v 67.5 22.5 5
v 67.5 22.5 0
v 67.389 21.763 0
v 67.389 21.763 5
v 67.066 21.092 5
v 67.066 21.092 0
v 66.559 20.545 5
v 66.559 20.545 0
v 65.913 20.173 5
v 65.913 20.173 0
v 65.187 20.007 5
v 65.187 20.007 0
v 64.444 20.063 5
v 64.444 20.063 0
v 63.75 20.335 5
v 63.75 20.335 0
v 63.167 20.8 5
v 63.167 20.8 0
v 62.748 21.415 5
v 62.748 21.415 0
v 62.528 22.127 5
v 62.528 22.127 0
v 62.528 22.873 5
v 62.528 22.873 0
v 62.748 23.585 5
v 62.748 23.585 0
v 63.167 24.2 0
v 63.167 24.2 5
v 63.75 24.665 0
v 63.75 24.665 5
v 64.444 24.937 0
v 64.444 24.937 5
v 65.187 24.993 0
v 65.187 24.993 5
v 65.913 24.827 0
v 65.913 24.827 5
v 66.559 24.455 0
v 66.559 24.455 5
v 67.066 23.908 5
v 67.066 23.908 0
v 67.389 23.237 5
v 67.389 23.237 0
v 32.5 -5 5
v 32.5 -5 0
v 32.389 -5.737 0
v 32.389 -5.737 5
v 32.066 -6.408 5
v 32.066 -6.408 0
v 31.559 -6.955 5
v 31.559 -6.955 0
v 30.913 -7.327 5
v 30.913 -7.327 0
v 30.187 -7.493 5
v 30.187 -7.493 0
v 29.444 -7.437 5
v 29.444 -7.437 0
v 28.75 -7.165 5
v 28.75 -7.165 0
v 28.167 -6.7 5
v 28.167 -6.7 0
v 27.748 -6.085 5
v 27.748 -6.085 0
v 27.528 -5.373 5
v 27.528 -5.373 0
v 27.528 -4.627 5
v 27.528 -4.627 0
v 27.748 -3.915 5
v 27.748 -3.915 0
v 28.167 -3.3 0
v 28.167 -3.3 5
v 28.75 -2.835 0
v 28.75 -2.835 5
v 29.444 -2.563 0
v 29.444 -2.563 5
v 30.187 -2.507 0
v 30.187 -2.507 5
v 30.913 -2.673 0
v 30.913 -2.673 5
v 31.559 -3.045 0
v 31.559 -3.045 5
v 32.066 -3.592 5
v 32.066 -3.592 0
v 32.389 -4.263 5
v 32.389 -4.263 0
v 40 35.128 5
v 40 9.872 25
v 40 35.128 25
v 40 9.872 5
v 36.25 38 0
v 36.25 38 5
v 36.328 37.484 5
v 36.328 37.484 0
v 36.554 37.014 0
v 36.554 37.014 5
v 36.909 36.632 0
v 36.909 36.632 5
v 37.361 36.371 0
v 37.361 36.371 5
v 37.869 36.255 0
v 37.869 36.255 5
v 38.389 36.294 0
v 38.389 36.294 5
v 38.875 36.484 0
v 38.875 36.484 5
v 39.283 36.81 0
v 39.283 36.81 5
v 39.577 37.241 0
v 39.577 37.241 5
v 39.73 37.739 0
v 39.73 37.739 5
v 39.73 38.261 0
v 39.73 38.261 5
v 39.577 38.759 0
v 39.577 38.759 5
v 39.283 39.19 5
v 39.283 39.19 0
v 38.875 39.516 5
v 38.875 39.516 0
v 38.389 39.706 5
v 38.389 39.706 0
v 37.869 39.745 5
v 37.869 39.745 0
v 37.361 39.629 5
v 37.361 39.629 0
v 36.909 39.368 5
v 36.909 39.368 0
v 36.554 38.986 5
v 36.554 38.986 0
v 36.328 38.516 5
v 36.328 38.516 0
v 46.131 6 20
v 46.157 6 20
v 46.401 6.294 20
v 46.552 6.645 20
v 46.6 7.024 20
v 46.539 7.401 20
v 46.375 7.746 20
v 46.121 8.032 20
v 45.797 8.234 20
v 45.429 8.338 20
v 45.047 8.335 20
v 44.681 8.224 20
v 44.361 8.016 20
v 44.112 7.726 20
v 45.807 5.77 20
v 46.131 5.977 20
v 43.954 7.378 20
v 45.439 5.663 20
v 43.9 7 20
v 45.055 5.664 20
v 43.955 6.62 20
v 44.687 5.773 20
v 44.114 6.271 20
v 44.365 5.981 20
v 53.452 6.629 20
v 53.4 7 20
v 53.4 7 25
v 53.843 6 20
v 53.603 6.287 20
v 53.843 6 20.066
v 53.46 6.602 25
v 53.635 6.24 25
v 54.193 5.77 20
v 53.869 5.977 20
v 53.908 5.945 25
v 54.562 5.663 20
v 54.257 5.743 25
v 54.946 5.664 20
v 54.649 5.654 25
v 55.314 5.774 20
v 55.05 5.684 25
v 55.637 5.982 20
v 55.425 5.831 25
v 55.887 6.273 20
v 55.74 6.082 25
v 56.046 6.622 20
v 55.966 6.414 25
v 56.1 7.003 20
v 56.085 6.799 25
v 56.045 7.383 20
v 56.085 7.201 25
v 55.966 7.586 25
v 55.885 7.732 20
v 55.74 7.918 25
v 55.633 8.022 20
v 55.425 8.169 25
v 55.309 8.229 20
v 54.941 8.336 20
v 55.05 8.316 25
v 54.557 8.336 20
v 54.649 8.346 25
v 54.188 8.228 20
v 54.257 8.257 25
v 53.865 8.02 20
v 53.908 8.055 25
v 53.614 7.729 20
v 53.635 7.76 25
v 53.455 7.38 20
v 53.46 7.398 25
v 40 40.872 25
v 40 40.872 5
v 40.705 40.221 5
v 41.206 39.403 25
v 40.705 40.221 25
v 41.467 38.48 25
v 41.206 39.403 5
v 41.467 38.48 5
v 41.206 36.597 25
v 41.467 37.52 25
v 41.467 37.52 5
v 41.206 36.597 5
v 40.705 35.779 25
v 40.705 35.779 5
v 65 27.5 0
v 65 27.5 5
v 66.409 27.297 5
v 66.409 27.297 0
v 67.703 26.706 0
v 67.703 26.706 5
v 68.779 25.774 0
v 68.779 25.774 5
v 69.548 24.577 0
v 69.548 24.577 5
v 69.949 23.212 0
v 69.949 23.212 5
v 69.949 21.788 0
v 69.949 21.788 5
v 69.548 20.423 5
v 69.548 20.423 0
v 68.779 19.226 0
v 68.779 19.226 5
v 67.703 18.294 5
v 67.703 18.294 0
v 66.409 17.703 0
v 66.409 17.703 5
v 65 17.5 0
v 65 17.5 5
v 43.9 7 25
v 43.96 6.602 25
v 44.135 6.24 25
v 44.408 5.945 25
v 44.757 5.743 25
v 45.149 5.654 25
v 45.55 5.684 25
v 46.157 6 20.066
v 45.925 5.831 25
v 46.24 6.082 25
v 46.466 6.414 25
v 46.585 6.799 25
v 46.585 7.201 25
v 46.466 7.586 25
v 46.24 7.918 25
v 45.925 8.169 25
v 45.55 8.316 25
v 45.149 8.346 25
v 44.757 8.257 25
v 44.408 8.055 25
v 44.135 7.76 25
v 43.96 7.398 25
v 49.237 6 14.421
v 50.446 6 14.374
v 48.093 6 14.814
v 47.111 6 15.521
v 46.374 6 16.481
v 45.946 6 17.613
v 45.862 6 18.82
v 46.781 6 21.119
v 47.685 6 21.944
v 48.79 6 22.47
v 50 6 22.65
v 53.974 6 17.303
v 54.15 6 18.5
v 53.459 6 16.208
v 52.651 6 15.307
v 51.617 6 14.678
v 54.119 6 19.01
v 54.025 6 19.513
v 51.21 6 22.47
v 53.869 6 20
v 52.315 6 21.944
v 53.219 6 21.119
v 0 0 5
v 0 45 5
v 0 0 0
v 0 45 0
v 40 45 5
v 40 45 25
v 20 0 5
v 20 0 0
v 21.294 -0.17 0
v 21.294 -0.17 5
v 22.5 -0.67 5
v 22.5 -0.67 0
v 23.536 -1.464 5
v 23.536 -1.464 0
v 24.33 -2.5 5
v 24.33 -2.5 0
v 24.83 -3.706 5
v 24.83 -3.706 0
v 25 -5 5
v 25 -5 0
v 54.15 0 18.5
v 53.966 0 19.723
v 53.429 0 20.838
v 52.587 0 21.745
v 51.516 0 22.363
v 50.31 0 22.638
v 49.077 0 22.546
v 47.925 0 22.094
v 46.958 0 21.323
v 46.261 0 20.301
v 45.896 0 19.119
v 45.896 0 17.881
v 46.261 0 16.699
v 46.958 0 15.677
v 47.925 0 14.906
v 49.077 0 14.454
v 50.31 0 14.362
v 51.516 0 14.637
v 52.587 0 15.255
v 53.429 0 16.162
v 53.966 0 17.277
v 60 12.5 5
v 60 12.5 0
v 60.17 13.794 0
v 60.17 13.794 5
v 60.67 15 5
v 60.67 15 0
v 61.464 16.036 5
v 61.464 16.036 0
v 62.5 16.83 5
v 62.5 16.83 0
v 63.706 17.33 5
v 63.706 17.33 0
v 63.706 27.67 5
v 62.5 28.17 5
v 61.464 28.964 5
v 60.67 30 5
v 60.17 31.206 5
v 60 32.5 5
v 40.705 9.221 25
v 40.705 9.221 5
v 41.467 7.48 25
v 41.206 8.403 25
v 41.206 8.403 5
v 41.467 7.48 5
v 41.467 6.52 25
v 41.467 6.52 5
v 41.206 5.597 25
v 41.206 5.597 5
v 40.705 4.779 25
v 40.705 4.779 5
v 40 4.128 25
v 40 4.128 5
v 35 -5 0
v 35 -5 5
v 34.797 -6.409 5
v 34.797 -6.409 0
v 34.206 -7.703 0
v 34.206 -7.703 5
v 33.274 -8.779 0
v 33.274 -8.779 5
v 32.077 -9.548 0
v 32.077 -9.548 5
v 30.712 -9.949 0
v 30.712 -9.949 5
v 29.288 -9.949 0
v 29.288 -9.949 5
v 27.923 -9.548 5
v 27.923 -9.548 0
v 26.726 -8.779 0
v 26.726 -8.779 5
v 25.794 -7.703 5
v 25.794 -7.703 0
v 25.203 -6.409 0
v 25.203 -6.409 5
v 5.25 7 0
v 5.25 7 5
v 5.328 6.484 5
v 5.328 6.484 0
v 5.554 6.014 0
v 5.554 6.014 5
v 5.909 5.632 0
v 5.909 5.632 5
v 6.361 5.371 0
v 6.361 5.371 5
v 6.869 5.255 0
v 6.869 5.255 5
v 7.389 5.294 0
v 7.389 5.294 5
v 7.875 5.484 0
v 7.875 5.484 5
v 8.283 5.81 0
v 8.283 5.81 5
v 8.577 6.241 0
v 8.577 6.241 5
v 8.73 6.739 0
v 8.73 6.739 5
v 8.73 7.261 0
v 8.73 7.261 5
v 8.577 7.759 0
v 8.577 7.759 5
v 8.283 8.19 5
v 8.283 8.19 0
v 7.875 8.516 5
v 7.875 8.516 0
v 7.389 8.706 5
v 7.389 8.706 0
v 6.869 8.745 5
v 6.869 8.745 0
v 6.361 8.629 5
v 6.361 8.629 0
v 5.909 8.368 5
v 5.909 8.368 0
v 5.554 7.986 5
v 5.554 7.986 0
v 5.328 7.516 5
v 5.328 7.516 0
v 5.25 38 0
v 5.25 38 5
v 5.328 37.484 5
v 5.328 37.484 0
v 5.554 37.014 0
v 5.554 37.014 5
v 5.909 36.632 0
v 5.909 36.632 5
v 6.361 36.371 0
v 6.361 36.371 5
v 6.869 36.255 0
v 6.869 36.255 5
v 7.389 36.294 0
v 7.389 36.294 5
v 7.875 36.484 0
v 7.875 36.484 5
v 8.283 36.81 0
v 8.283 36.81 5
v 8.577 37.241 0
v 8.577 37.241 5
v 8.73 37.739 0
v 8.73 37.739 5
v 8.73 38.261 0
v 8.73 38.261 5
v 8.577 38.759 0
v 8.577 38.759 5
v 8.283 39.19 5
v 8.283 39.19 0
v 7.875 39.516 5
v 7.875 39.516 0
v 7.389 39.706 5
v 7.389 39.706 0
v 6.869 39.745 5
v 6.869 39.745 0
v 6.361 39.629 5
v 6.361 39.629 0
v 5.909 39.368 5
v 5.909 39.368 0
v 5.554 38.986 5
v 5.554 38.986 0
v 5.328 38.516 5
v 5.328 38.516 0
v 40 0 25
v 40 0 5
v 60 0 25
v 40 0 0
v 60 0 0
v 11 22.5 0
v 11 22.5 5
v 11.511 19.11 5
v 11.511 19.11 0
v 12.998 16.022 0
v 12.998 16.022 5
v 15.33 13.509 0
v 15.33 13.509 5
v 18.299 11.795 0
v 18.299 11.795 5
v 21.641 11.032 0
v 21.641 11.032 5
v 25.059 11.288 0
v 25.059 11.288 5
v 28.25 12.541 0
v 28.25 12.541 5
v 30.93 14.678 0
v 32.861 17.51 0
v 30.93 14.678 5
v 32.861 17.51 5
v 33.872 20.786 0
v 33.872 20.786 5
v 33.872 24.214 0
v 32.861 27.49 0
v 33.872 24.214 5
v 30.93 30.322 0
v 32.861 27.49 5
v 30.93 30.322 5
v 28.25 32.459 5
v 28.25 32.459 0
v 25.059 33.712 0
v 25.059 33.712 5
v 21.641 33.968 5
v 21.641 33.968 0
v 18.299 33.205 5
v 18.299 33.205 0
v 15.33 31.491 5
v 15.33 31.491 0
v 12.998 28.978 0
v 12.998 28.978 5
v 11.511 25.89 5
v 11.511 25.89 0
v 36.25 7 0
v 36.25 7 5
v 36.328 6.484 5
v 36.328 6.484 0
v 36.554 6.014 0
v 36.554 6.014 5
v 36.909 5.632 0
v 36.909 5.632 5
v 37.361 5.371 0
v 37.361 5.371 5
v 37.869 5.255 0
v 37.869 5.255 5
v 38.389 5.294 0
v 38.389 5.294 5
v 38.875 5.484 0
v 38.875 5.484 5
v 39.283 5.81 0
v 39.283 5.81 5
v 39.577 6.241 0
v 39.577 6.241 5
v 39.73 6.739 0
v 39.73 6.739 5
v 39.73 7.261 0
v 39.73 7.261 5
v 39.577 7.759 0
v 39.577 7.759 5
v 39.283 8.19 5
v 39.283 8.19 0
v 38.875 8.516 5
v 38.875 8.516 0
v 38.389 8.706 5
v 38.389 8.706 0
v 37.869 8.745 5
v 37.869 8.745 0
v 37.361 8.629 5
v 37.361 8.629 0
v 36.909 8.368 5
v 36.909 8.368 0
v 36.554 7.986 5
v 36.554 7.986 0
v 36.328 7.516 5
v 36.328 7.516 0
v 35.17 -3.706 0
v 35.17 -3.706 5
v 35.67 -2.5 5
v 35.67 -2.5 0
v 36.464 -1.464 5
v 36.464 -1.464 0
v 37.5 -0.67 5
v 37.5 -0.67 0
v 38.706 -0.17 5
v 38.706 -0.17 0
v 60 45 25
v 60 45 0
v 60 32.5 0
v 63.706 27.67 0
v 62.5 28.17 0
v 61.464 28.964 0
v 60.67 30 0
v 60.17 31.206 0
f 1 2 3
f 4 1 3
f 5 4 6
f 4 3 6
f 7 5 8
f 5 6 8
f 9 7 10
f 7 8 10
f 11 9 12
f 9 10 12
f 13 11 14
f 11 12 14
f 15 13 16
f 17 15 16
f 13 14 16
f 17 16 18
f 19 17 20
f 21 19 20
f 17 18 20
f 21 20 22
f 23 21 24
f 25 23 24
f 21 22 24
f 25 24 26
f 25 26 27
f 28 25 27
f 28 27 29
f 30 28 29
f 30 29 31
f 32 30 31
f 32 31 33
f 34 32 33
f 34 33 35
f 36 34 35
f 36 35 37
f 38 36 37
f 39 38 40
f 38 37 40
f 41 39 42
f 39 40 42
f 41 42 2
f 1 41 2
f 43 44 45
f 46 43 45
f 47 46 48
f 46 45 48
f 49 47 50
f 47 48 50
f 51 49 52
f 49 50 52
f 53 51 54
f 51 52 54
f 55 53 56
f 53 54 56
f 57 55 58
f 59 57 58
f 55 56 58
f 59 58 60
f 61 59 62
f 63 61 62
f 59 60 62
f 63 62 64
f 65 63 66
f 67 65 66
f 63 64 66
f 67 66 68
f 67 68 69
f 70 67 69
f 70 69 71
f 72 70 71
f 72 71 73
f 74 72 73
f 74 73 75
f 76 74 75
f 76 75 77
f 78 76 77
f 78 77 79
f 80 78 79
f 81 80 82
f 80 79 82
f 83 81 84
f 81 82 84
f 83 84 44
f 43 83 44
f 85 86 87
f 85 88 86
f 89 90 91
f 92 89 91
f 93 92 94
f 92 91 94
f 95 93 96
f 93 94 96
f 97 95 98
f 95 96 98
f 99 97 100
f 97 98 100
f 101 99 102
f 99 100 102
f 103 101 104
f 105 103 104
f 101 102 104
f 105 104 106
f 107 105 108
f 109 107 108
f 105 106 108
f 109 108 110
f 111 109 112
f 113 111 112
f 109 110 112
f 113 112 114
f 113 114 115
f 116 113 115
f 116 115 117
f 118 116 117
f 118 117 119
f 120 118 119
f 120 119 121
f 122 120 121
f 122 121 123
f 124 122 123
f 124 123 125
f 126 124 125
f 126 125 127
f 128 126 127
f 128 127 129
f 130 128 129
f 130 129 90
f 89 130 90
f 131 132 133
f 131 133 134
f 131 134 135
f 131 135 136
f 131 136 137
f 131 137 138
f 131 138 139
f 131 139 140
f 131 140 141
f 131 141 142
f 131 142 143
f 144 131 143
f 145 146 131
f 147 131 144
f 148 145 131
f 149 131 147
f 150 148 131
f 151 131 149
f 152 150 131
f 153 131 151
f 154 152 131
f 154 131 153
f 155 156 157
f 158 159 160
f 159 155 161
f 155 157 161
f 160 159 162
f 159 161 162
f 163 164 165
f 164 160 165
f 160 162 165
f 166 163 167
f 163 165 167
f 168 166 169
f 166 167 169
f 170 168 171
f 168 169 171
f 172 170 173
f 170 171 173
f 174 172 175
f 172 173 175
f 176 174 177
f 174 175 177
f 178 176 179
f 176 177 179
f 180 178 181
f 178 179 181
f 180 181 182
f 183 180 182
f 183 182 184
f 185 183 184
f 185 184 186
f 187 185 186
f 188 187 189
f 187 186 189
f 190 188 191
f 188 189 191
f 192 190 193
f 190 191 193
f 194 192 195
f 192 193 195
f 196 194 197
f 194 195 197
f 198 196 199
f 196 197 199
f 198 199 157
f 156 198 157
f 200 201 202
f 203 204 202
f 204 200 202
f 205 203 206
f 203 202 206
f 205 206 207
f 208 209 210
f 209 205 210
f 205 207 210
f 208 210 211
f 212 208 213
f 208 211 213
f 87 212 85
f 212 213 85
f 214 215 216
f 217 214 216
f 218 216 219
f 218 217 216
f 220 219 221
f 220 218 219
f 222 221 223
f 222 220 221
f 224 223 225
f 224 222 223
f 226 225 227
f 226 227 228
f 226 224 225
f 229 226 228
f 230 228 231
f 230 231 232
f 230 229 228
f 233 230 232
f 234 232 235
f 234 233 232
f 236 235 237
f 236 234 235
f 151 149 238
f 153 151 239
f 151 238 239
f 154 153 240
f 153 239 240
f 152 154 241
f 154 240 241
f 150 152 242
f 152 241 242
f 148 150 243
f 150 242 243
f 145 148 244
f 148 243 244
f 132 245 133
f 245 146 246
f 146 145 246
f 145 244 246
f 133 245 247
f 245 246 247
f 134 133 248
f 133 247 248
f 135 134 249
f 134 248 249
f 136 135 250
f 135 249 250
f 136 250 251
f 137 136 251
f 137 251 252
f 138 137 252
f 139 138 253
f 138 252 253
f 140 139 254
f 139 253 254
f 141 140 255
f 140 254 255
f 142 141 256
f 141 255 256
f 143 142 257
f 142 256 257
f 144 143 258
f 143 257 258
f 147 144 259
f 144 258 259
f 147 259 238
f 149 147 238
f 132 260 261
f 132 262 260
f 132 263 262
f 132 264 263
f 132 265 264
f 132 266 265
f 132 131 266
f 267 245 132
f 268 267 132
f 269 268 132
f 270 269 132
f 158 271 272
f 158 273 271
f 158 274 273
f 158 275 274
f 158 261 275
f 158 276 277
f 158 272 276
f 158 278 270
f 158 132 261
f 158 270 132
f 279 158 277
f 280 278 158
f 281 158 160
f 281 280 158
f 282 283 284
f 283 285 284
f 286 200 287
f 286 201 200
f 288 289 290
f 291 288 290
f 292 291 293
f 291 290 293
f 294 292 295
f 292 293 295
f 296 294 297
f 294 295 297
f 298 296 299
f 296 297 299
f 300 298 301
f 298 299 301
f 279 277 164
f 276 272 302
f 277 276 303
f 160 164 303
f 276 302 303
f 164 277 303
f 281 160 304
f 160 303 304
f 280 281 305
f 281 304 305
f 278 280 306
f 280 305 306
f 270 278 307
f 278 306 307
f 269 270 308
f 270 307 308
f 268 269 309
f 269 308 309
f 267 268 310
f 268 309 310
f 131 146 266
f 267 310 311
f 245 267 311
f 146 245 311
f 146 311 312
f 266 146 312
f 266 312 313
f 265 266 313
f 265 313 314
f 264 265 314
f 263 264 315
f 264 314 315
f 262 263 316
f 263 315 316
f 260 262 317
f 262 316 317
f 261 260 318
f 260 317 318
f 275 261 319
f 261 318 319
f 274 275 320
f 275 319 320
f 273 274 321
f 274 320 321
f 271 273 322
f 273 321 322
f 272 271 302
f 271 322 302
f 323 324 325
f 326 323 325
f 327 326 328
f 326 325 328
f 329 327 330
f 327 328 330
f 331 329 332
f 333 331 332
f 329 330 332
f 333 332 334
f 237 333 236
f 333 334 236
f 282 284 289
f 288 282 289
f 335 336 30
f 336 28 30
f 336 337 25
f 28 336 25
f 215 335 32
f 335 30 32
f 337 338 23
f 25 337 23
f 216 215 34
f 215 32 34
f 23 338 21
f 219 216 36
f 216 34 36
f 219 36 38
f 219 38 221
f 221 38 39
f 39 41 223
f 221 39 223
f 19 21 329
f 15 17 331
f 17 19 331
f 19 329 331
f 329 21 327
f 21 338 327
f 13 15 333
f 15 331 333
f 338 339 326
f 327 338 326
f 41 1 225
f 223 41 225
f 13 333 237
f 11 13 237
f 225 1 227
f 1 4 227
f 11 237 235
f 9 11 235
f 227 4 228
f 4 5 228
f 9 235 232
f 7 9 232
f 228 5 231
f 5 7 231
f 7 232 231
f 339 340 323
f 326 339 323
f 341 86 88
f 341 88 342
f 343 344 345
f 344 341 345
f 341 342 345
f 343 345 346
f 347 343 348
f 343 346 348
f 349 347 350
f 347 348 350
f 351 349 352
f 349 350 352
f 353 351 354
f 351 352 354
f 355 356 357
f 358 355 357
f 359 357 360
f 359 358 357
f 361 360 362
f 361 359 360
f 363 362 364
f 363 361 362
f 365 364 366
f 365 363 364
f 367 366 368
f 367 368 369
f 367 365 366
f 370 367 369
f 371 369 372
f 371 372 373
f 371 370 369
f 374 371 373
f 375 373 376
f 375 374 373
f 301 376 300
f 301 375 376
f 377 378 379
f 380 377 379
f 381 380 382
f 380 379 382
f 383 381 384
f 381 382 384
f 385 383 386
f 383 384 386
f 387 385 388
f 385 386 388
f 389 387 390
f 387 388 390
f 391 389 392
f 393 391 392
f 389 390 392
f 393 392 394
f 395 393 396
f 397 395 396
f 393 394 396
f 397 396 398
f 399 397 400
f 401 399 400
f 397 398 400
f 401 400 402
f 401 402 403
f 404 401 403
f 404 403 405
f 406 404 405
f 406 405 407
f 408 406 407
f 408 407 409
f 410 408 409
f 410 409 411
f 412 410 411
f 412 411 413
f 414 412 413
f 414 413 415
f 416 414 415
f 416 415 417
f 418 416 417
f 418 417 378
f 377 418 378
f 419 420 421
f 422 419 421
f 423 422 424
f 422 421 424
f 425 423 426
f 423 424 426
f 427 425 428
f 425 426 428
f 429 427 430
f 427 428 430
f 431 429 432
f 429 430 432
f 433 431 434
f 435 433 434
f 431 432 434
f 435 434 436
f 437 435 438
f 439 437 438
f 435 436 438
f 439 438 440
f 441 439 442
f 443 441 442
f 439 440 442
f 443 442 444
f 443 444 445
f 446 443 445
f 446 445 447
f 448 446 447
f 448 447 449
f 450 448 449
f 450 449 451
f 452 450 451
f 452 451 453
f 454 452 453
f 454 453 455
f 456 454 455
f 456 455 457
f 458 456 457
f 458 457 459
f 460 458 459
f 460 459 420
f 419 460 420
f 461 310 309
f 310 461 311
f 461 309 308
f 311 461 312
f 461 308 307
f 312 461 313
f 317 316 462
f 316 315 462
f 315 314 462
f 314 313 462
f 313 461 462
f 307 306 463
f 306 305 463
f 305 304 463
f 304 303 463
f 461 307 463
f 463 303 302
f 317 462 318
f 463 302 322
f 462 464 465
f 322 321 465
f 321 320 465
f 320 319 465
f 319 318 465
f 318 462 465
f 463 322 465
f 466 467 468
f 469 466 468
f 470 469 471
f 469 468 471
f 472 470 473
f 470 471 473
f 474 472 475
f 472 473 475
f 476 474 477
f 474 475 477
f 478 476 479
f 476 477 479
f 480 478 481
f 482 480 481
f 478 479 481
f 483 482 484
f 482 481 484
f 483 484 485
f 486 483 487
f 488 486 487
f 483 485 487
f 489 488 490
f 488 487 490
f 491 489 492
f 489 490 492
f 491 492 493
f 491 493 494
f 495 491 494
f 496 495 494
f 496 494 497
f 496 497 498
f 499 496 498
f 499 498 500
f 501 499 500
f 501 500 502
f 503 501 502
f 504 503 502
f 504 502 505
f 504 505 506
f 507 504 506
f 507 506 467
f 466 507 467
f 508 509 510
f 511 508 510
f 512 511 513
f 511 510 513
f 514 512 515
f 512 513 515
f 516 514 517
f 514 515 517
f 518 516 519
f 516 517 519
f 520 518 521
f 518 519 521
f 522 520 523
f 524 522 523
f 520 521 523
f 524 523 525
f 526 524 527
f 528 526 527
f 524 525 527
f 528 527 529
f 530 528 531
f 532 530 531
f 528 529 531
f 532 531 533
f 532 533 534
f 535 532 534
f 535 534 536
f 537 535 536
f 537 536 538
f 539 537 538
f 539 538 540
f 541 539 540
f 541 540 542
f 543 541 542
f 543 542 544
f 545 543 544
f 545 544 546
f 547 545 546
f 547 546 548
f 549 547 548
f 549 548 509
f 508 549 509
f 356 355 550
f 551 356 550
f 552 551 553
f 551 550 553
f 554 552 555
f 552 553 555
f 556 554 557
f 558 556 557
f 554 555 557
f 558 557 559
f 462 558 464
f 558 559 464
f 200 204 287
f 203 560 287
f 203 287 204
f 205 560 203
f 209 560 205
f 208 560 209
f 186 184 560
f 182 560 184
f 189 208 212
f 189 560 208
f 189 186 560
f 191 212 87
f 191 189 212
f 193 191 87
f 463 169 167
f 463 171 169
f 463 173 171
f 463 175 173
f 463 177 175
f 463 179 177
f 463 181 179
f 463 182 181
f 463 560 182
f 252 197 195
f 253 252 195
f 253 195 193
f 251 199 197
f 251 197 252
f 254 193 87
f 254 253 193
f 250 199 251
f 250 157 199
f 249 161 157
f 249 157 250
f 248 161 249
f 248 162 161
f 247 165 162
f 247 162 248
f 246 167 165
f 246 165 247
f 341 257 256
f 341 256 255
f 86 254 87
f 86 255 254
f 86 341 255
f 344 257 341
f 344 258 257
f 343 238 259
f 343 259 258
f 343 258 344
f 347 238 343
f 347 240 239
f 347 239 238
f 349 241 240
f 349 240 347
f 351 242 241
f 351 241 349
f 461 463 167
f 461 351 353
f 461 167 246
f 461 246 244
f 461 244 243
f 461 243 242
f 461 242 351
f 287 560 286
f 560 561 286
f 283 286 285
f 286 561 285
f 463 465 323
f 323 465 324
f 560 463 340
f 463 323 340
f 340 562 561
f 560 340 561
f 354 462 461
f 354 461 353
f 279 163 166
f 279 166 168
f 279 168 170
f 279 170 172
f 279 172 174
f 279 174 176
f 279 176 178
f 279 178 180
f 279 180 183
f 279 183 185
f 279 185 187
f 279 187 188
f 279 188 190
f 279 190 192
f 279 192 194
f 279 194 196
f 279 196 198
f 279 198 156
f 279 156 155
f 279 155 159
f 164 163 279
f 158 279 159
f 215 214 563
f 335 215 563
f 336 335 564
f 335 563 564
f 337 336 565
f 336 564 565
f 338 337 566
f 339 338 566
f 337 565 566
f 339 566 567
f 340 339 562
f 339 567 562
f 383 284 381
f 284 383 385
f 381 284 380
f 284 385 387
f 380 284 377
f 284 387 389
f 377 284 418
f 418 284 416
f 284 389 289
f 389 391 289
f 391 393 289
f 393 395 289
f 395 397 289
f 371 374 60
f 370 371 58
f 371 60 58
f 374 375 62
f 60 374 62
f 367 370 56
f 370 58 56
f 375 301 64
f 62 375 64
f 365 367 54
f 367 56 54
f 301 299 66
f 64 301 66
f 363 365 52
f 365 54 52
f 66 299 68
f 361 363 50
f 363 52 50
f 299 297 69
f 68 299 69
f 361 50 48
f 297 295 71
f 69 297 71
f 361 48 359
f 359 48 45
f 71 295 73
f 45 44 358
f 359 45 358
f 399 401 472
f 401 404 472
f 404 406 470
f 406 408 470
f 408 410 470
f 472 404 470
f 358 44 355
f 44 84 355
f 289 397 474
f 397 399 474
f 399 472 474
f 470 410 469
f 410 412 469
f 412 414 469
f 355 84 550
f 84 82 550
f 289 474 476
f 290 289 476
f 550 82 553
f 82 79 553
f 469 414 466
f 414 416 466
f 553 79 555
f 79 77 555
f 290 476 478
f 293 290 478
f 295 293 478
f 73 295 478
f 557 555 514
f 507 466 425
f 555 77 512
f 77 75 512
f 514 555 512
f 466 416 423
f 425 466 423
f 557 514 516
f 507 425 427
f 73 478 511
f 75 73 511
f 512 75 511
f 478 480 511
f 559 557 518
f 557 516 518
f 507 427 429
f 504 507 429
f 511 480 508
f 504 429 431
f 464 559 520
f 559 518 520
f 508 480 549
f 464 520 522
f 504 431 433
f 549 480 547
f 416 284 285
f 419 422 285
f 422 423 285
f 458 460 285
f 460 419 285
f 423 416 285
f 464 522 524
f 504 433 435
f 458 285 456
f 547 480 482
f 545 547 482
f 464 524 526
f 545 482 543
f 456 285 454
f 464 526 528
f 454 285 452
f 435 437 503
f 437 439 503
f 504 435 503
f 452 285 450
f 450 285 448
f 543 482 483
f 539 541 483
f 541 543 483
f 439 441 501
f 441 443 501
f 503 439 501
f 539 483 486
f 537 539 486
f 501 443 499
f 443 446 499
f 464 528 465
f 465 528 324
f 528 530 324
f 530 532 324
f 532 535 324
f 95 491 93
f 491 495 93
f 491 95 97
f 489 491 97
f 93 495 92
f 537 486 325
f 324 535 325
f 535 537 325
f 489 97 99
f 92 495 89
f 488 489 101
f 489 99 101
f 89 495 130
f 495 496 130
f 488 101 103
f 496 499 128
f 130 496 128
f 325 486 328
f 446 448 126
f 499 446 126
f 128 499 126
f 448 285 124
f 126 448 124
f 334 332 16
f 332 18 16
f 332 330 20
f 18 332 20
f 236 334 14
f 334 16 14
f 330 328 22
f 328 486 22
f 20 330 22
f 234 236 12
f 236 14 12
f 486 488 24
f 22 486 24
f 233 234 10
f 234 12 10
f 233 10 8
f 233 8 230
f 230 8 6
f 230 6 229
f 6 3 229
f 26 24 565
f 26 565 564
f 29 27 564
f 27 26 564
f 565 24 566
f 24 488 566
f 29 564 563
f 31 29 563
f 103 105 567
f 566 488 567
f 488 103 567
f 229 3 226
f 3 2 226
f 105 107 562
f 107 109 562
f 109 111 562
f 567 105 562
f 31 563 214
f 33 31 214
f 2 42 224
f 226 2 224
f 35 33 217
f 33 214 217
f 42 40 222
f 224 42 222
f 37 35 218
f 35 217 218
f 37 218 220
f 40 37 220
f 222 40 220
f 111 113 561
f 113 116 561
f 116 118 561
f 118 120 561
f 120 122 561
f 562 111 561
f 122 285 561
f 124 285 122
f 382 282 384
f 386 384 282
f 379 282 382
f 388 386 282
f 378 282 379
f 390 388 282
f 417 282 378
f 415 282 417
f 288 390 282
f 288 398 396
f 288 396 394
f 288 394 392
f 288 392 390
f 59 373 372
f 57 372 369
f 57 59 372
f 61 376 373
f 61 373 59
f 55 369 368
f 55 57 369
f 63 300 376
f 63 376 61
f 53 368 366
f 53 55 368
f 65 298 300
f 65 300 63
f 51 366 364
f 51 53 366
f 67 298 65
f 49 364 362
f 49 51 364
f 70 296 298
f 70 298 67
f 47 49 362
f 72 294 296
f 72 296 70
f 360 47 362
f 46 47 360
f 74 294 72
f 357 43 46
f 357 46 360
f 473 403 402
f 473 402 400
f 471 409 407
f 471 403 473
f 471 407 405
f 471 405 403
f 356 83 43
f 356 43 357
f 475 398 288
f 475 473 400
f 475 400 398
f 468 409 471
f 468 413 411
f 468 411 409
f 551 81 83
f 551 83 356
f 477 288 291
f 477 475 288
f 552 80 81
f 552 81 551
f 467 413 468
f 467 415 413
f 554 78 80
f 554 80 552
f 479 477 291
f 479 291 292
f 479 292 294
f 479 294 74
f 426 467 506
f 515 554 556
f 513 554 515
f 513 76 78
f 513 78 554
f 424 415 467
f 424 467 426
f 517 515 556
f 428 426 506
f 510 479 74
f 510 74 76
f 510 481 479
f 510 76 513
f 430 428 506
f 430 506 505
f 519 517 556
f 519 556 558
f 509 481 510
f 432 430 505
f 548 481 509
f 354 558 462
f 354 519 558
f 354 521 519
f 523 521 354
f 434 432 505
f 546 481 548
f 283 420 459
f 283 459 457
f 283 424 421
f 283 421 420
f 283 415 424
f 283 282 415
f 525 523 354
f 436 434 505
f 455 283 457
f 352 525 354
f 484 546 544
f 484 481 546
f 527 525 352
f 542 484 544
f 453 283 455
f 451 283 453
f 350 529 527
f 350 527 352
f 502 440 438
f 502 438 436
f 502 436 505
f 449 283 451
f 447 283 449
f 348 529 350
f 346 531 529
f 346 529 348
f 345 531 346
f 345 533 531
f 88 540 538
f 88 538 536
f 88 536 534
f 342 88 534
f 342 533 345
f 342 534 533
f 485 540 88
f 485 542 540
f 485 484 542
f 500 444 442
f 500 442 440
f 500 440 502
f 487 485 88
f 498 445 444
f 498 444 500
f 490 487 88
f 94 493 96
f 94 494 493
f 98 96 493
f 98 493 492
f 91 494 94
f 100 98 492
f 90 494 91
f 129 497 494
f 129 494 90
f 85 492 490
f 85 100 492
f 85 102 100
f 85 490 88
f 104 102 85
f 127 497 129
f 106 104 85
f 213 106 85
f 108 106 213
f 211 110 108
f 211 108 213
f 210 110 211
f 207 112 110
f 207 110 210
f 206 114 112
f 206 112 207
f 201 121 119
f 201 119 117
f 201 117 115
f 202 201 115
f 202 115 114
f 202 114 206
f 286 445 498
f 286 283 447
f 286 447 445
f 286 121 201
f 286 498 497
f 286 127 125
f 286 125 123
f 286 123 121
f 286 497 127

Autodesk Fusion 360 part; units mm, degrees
sketch "Skizze1" plane through (0, 0, 0) normal (0, 0, 1) x (1, 0, 0)
  line L0 (0, 0) -> (60, 0)
  line L1 (60, 0) -> (60, 45)
  line L2 (60, 45) -> (0, 45)
  line L3 (0, 45) -> (0, 0)
  dimension "d1" = 60
  dimension "d2" = 45
extrude "Extrusion1" add sketch "Skizze1" along normal blind 5
sketch "Skizze2" plane through (0, 0, 5) normal (0, 0, 1) x (-1, 0, 0)
  line L0 (0, -45) -> (0, 0)
  line L1 (0, 0) -> (-60, 0)
  line L2 (-60, 0) -> (-60, -45)
  line L3 (-60, -45) -> (0, -45)
  line L4 (0, 0) -> (-45, 0)
  line L5 (-45, 0) -> (-45, -45)
  line L6 (-45, -45) -> (0, -45)
  line L7 (0, -45) -> (0, 0)
  line L8 (-22.5, -45) -> (-22.5, 0)
  line L9 (0, -22.5) -> (-45, -22.5)
  circle A0 centre (-22.5, -22.5) radius 11.5
  line L10 (-22.5, -22.5) -> (-7, -22.5)
  line L11 (-7, -22.5) -> (-7, -38)
  line L12 (-7, -38) -> (-22.5, -38)
  line L13 (-22.5, -38) -> (-22.5, -22.5)
  line L14 (-22.5, -38) -> (-38, -38)
  line L15 (-38, -38) -> (-38, -7)
  line L16 (-7, -22.5) -> (-7, -7)
  line L17 (-38, -7) -> (-7, -7)
  circle A1 centre (-7, -38) radius 1.75
  circle A2 centre (-38, -38) radius 1.75
  circle A3 centre (-38, -7) radius 1.75
  circle A4 centre (-7, -7) radius 1.75
  dimension "d7" = 23
  dimension "d8" = 15.5
  dimension "d9" = 15.5
  dimension "d10" = 31
  dimension "d11" = 3.5
extrude "Extrusion2" cut sketch "Skizze2" against normal blind 5 contours L8 L9 A0 L10 L13 | L8 L9 A0 L10 | L11 L12 A1 | L11 L12 A1 | L16 L17 A4 | L16 L17 A4 | L8 L9 A0 L13 | L14 L15 A2 | L14 L15 A2 | L8 L9 A0 | L15 L17 A3 | L15 L17 A3
sketch "Skizze3" plane through (0, 0, 5) normal (0, 0, 1) x (-1, 0, 0)
  circle A0 centre (-22.5, -22.5) radius 11.5
  circle A1 centre (-38, -38) radius 1.75
  circle A2 centre (-38, -7) radius 1.75
  circle A3 centre (-7, -38) radius 1.75
  circle A4 centre (-7, -7) radius 1.75
  line L0 (0, -45) -> (0, 0)
  line L1 (0, 0) -> (-60, 0)
  line L2 (-60, 0) -> (-60, -45)
  line L3 (-60, -45) -> (0, -45)
  line L4 (-60, 0) -> (-40, 0)
  line L5 (-40, -45) -> (-60, -45)
  line L6 (-60, -45) -> (-60, 0)
  line L7 (-40, -40.8723) -> (-40, -45)
  arc A5 (-40, -35.1277) -> (-40, -40.8723) centre (-38, -38) ccw
  line L8 (-40, 0) -> (-40, -4.1277)
  line L9 (-40, -9.8723) -> (-40, -35.1277)
  arc A6 (-40, -4.1277) -> (-40, -9.8723) centre (-38, -7) ccw
  dimension "d14" = 20
  dimension "d15" = 7
  dimension "d16" = 7
extrude "Extrusion3" add sketch "Skizze3" along normal blind 20 contours L1 L2 L3 L4 L5 L6 L7 A5 L8 L9 A6
sketch "Skizze4" plane through (0, 0, 0) normal (0, 0, -1) x (1, 0, 0)
  circle A0 centre (22.5, -22.5) radius 11.5
  circle A1 centre (38, -38) radius 1.75
  circle A2 centre (38, -7) radius 1.75
  circle A3 centre (7, -38) radius 1.75
  circle A4 centre (7, -7) radius 1.75
  line L0 (0, 0) -> (0, -45)
  line L1 (0, -45) -> (60, -45)
  line L2 (60, -45) -> (60, 0)
  line L3 (60, 0) -> (0, 0)
  line L4 (60, -22.5) -> (70, -22.5)
  line L5 (30, -45) -> (30, -55)
  line L6 (30, -50) -> (40, -50)
  line L7 (40, -50) -> (30, -50)
  line L8 (30, -50) -> (20, -50)
  line L9 (65, -22.5) -> (65, -12.5)
  line L10 (65, -22.5) -> (65, -32.5)
  circle A5 centre (65, -22.5) radius 5
  circle A6 centre (30, -50) radius 5
  circle A7 centre (20, -50) radius 5
  circle A8 centre (40, -50) radius 5
  circle A9 centre (65, -12.5) radius 5
  circle A10 centre (65, -32.5) radius 5
  circle A11 centre (30, -50) radius 2.5
  circle A12 centre (65, -22.5) radius 2.5
  line L11 (30, 0) -> (30, 10)
  line L12 (30, 5) -> (40, 5)
  line L13 (30, 5) -> (20, 5)
  circle A13 centre (30, 5) radius 5
  circle A14 centre (20, 5) radius 5
  circle A15 centre (40, 5) radius 5
  circle A16 centre (30, 5) radius 2.5
  dimension "d19" = 10
  dimension "d20" = 10
  dimension "d21" = 10
  dimension "d22" = 10
  dimension "d27" = 5
  dimension "d28" = 5
  dimension "d35" = 10
  dimension "d36" = 10
  dimension "d37" = 5
extrude "Extrusion4" add sketch "Skizze4" against normal blind 5 contours L3 A13 A14 | L3 A13 A15 | L11 L13 A13 A16 | L11 L12 A13 A16 | L11 L13 A13 A16 | L11 L12 A13 A16 | L2 A5 A9 | L2 A5 A10 | L4 L9 A5 A12 | L4 L10 A5 A12 | L4 L9 A5 A12 | L4 L10 A5 A12
sketch "Skizze5" plane through (0, 45, 0) normal (0, 1, 0) x (-1, 0, 0)
  line L0 (-40, 5) -> (-40, 25)
  line L1 (-40, 25) -> (-60, 25)
  line L2 (-60, 25) -> (-60, 0)
  line L3 (-60, 0) -> (0, 0)
  line L4 (-30, 0) -> (-30, 18.5)
  circle A0 centre (-30, 18.5) radius 4.15
  line L5 (0, 0) -> (0, 5)
  line L6 (0, 5) -> (-40, 5)
  dimension "d31" = 18.5
  dimension "d32" = 8.3
extrude "Extrusion5" cut sketch "Skizze5" against normal blind 6 contours A0
sketch "Skizze6" plane through (0, 0, 0) normal (0, -1, 0) x (1, 0, 0)
  line L0 (40, 5) -> (40, 0)
  line L1 (40, 0) -> (60, 0)
  line L2 (60, 0) -> (60, 25)
  line L3 (60, 25) -> (40, 25)
  line L4 (40, 25) -> (40, 5)
  line L5 (50, 0) -> (50, 18.5)
  circle A0 centre (50, 18.5) radius 4.15
  dimension "d38" = 18.5
  dimension "d39" = 8.3
extrude "Extrusion6" cut sketch "Skizze6" against normal blind 6 contours A0
sketch "Skizze8" plane through (0, 0, 25) normal (0, 0, 1) x (-1, 0, 0)
  line L0 (-40, -4.1277) -> (-40, 0)
  line L1 (-40, 0) -> (-60, 0)
  line L2 (-60, 0) -> (-60, -45)
  line L3 (-60, -45) -> (-40, -45)
  line L4 (-40, -45) -> (-40, -40.8723)
  arc A0 (-40, -35.1277) -> (-40, -40.8723) centre (-38, -38) ccw
  line L5 (-40, -35.1277) -> (-40, -9.8723)
  arc A1 (-40, -4.1277) -> (-40, -9.8723) centre (-38, -7) ccw
  line L6 (-50, 0) -> (-50, -7)
  line L7 (-50, -7) -> (-45.25, -7)
  line L8 (-50, -7) -> (-54.75, -7)
  circle A2 centre (-45.25, -7) radius 1.35
  circle A3 centre (-54.75, -7) radius 1.35
  dimension "d42" = 7
  dimension "d43" = 4.75
  dimension "d44" = 2.7
  dimension "d45" = 2.7
extrude "Extrusion7" cut sketch "Skizze8" against normal blind 5 contours A2 | A3
